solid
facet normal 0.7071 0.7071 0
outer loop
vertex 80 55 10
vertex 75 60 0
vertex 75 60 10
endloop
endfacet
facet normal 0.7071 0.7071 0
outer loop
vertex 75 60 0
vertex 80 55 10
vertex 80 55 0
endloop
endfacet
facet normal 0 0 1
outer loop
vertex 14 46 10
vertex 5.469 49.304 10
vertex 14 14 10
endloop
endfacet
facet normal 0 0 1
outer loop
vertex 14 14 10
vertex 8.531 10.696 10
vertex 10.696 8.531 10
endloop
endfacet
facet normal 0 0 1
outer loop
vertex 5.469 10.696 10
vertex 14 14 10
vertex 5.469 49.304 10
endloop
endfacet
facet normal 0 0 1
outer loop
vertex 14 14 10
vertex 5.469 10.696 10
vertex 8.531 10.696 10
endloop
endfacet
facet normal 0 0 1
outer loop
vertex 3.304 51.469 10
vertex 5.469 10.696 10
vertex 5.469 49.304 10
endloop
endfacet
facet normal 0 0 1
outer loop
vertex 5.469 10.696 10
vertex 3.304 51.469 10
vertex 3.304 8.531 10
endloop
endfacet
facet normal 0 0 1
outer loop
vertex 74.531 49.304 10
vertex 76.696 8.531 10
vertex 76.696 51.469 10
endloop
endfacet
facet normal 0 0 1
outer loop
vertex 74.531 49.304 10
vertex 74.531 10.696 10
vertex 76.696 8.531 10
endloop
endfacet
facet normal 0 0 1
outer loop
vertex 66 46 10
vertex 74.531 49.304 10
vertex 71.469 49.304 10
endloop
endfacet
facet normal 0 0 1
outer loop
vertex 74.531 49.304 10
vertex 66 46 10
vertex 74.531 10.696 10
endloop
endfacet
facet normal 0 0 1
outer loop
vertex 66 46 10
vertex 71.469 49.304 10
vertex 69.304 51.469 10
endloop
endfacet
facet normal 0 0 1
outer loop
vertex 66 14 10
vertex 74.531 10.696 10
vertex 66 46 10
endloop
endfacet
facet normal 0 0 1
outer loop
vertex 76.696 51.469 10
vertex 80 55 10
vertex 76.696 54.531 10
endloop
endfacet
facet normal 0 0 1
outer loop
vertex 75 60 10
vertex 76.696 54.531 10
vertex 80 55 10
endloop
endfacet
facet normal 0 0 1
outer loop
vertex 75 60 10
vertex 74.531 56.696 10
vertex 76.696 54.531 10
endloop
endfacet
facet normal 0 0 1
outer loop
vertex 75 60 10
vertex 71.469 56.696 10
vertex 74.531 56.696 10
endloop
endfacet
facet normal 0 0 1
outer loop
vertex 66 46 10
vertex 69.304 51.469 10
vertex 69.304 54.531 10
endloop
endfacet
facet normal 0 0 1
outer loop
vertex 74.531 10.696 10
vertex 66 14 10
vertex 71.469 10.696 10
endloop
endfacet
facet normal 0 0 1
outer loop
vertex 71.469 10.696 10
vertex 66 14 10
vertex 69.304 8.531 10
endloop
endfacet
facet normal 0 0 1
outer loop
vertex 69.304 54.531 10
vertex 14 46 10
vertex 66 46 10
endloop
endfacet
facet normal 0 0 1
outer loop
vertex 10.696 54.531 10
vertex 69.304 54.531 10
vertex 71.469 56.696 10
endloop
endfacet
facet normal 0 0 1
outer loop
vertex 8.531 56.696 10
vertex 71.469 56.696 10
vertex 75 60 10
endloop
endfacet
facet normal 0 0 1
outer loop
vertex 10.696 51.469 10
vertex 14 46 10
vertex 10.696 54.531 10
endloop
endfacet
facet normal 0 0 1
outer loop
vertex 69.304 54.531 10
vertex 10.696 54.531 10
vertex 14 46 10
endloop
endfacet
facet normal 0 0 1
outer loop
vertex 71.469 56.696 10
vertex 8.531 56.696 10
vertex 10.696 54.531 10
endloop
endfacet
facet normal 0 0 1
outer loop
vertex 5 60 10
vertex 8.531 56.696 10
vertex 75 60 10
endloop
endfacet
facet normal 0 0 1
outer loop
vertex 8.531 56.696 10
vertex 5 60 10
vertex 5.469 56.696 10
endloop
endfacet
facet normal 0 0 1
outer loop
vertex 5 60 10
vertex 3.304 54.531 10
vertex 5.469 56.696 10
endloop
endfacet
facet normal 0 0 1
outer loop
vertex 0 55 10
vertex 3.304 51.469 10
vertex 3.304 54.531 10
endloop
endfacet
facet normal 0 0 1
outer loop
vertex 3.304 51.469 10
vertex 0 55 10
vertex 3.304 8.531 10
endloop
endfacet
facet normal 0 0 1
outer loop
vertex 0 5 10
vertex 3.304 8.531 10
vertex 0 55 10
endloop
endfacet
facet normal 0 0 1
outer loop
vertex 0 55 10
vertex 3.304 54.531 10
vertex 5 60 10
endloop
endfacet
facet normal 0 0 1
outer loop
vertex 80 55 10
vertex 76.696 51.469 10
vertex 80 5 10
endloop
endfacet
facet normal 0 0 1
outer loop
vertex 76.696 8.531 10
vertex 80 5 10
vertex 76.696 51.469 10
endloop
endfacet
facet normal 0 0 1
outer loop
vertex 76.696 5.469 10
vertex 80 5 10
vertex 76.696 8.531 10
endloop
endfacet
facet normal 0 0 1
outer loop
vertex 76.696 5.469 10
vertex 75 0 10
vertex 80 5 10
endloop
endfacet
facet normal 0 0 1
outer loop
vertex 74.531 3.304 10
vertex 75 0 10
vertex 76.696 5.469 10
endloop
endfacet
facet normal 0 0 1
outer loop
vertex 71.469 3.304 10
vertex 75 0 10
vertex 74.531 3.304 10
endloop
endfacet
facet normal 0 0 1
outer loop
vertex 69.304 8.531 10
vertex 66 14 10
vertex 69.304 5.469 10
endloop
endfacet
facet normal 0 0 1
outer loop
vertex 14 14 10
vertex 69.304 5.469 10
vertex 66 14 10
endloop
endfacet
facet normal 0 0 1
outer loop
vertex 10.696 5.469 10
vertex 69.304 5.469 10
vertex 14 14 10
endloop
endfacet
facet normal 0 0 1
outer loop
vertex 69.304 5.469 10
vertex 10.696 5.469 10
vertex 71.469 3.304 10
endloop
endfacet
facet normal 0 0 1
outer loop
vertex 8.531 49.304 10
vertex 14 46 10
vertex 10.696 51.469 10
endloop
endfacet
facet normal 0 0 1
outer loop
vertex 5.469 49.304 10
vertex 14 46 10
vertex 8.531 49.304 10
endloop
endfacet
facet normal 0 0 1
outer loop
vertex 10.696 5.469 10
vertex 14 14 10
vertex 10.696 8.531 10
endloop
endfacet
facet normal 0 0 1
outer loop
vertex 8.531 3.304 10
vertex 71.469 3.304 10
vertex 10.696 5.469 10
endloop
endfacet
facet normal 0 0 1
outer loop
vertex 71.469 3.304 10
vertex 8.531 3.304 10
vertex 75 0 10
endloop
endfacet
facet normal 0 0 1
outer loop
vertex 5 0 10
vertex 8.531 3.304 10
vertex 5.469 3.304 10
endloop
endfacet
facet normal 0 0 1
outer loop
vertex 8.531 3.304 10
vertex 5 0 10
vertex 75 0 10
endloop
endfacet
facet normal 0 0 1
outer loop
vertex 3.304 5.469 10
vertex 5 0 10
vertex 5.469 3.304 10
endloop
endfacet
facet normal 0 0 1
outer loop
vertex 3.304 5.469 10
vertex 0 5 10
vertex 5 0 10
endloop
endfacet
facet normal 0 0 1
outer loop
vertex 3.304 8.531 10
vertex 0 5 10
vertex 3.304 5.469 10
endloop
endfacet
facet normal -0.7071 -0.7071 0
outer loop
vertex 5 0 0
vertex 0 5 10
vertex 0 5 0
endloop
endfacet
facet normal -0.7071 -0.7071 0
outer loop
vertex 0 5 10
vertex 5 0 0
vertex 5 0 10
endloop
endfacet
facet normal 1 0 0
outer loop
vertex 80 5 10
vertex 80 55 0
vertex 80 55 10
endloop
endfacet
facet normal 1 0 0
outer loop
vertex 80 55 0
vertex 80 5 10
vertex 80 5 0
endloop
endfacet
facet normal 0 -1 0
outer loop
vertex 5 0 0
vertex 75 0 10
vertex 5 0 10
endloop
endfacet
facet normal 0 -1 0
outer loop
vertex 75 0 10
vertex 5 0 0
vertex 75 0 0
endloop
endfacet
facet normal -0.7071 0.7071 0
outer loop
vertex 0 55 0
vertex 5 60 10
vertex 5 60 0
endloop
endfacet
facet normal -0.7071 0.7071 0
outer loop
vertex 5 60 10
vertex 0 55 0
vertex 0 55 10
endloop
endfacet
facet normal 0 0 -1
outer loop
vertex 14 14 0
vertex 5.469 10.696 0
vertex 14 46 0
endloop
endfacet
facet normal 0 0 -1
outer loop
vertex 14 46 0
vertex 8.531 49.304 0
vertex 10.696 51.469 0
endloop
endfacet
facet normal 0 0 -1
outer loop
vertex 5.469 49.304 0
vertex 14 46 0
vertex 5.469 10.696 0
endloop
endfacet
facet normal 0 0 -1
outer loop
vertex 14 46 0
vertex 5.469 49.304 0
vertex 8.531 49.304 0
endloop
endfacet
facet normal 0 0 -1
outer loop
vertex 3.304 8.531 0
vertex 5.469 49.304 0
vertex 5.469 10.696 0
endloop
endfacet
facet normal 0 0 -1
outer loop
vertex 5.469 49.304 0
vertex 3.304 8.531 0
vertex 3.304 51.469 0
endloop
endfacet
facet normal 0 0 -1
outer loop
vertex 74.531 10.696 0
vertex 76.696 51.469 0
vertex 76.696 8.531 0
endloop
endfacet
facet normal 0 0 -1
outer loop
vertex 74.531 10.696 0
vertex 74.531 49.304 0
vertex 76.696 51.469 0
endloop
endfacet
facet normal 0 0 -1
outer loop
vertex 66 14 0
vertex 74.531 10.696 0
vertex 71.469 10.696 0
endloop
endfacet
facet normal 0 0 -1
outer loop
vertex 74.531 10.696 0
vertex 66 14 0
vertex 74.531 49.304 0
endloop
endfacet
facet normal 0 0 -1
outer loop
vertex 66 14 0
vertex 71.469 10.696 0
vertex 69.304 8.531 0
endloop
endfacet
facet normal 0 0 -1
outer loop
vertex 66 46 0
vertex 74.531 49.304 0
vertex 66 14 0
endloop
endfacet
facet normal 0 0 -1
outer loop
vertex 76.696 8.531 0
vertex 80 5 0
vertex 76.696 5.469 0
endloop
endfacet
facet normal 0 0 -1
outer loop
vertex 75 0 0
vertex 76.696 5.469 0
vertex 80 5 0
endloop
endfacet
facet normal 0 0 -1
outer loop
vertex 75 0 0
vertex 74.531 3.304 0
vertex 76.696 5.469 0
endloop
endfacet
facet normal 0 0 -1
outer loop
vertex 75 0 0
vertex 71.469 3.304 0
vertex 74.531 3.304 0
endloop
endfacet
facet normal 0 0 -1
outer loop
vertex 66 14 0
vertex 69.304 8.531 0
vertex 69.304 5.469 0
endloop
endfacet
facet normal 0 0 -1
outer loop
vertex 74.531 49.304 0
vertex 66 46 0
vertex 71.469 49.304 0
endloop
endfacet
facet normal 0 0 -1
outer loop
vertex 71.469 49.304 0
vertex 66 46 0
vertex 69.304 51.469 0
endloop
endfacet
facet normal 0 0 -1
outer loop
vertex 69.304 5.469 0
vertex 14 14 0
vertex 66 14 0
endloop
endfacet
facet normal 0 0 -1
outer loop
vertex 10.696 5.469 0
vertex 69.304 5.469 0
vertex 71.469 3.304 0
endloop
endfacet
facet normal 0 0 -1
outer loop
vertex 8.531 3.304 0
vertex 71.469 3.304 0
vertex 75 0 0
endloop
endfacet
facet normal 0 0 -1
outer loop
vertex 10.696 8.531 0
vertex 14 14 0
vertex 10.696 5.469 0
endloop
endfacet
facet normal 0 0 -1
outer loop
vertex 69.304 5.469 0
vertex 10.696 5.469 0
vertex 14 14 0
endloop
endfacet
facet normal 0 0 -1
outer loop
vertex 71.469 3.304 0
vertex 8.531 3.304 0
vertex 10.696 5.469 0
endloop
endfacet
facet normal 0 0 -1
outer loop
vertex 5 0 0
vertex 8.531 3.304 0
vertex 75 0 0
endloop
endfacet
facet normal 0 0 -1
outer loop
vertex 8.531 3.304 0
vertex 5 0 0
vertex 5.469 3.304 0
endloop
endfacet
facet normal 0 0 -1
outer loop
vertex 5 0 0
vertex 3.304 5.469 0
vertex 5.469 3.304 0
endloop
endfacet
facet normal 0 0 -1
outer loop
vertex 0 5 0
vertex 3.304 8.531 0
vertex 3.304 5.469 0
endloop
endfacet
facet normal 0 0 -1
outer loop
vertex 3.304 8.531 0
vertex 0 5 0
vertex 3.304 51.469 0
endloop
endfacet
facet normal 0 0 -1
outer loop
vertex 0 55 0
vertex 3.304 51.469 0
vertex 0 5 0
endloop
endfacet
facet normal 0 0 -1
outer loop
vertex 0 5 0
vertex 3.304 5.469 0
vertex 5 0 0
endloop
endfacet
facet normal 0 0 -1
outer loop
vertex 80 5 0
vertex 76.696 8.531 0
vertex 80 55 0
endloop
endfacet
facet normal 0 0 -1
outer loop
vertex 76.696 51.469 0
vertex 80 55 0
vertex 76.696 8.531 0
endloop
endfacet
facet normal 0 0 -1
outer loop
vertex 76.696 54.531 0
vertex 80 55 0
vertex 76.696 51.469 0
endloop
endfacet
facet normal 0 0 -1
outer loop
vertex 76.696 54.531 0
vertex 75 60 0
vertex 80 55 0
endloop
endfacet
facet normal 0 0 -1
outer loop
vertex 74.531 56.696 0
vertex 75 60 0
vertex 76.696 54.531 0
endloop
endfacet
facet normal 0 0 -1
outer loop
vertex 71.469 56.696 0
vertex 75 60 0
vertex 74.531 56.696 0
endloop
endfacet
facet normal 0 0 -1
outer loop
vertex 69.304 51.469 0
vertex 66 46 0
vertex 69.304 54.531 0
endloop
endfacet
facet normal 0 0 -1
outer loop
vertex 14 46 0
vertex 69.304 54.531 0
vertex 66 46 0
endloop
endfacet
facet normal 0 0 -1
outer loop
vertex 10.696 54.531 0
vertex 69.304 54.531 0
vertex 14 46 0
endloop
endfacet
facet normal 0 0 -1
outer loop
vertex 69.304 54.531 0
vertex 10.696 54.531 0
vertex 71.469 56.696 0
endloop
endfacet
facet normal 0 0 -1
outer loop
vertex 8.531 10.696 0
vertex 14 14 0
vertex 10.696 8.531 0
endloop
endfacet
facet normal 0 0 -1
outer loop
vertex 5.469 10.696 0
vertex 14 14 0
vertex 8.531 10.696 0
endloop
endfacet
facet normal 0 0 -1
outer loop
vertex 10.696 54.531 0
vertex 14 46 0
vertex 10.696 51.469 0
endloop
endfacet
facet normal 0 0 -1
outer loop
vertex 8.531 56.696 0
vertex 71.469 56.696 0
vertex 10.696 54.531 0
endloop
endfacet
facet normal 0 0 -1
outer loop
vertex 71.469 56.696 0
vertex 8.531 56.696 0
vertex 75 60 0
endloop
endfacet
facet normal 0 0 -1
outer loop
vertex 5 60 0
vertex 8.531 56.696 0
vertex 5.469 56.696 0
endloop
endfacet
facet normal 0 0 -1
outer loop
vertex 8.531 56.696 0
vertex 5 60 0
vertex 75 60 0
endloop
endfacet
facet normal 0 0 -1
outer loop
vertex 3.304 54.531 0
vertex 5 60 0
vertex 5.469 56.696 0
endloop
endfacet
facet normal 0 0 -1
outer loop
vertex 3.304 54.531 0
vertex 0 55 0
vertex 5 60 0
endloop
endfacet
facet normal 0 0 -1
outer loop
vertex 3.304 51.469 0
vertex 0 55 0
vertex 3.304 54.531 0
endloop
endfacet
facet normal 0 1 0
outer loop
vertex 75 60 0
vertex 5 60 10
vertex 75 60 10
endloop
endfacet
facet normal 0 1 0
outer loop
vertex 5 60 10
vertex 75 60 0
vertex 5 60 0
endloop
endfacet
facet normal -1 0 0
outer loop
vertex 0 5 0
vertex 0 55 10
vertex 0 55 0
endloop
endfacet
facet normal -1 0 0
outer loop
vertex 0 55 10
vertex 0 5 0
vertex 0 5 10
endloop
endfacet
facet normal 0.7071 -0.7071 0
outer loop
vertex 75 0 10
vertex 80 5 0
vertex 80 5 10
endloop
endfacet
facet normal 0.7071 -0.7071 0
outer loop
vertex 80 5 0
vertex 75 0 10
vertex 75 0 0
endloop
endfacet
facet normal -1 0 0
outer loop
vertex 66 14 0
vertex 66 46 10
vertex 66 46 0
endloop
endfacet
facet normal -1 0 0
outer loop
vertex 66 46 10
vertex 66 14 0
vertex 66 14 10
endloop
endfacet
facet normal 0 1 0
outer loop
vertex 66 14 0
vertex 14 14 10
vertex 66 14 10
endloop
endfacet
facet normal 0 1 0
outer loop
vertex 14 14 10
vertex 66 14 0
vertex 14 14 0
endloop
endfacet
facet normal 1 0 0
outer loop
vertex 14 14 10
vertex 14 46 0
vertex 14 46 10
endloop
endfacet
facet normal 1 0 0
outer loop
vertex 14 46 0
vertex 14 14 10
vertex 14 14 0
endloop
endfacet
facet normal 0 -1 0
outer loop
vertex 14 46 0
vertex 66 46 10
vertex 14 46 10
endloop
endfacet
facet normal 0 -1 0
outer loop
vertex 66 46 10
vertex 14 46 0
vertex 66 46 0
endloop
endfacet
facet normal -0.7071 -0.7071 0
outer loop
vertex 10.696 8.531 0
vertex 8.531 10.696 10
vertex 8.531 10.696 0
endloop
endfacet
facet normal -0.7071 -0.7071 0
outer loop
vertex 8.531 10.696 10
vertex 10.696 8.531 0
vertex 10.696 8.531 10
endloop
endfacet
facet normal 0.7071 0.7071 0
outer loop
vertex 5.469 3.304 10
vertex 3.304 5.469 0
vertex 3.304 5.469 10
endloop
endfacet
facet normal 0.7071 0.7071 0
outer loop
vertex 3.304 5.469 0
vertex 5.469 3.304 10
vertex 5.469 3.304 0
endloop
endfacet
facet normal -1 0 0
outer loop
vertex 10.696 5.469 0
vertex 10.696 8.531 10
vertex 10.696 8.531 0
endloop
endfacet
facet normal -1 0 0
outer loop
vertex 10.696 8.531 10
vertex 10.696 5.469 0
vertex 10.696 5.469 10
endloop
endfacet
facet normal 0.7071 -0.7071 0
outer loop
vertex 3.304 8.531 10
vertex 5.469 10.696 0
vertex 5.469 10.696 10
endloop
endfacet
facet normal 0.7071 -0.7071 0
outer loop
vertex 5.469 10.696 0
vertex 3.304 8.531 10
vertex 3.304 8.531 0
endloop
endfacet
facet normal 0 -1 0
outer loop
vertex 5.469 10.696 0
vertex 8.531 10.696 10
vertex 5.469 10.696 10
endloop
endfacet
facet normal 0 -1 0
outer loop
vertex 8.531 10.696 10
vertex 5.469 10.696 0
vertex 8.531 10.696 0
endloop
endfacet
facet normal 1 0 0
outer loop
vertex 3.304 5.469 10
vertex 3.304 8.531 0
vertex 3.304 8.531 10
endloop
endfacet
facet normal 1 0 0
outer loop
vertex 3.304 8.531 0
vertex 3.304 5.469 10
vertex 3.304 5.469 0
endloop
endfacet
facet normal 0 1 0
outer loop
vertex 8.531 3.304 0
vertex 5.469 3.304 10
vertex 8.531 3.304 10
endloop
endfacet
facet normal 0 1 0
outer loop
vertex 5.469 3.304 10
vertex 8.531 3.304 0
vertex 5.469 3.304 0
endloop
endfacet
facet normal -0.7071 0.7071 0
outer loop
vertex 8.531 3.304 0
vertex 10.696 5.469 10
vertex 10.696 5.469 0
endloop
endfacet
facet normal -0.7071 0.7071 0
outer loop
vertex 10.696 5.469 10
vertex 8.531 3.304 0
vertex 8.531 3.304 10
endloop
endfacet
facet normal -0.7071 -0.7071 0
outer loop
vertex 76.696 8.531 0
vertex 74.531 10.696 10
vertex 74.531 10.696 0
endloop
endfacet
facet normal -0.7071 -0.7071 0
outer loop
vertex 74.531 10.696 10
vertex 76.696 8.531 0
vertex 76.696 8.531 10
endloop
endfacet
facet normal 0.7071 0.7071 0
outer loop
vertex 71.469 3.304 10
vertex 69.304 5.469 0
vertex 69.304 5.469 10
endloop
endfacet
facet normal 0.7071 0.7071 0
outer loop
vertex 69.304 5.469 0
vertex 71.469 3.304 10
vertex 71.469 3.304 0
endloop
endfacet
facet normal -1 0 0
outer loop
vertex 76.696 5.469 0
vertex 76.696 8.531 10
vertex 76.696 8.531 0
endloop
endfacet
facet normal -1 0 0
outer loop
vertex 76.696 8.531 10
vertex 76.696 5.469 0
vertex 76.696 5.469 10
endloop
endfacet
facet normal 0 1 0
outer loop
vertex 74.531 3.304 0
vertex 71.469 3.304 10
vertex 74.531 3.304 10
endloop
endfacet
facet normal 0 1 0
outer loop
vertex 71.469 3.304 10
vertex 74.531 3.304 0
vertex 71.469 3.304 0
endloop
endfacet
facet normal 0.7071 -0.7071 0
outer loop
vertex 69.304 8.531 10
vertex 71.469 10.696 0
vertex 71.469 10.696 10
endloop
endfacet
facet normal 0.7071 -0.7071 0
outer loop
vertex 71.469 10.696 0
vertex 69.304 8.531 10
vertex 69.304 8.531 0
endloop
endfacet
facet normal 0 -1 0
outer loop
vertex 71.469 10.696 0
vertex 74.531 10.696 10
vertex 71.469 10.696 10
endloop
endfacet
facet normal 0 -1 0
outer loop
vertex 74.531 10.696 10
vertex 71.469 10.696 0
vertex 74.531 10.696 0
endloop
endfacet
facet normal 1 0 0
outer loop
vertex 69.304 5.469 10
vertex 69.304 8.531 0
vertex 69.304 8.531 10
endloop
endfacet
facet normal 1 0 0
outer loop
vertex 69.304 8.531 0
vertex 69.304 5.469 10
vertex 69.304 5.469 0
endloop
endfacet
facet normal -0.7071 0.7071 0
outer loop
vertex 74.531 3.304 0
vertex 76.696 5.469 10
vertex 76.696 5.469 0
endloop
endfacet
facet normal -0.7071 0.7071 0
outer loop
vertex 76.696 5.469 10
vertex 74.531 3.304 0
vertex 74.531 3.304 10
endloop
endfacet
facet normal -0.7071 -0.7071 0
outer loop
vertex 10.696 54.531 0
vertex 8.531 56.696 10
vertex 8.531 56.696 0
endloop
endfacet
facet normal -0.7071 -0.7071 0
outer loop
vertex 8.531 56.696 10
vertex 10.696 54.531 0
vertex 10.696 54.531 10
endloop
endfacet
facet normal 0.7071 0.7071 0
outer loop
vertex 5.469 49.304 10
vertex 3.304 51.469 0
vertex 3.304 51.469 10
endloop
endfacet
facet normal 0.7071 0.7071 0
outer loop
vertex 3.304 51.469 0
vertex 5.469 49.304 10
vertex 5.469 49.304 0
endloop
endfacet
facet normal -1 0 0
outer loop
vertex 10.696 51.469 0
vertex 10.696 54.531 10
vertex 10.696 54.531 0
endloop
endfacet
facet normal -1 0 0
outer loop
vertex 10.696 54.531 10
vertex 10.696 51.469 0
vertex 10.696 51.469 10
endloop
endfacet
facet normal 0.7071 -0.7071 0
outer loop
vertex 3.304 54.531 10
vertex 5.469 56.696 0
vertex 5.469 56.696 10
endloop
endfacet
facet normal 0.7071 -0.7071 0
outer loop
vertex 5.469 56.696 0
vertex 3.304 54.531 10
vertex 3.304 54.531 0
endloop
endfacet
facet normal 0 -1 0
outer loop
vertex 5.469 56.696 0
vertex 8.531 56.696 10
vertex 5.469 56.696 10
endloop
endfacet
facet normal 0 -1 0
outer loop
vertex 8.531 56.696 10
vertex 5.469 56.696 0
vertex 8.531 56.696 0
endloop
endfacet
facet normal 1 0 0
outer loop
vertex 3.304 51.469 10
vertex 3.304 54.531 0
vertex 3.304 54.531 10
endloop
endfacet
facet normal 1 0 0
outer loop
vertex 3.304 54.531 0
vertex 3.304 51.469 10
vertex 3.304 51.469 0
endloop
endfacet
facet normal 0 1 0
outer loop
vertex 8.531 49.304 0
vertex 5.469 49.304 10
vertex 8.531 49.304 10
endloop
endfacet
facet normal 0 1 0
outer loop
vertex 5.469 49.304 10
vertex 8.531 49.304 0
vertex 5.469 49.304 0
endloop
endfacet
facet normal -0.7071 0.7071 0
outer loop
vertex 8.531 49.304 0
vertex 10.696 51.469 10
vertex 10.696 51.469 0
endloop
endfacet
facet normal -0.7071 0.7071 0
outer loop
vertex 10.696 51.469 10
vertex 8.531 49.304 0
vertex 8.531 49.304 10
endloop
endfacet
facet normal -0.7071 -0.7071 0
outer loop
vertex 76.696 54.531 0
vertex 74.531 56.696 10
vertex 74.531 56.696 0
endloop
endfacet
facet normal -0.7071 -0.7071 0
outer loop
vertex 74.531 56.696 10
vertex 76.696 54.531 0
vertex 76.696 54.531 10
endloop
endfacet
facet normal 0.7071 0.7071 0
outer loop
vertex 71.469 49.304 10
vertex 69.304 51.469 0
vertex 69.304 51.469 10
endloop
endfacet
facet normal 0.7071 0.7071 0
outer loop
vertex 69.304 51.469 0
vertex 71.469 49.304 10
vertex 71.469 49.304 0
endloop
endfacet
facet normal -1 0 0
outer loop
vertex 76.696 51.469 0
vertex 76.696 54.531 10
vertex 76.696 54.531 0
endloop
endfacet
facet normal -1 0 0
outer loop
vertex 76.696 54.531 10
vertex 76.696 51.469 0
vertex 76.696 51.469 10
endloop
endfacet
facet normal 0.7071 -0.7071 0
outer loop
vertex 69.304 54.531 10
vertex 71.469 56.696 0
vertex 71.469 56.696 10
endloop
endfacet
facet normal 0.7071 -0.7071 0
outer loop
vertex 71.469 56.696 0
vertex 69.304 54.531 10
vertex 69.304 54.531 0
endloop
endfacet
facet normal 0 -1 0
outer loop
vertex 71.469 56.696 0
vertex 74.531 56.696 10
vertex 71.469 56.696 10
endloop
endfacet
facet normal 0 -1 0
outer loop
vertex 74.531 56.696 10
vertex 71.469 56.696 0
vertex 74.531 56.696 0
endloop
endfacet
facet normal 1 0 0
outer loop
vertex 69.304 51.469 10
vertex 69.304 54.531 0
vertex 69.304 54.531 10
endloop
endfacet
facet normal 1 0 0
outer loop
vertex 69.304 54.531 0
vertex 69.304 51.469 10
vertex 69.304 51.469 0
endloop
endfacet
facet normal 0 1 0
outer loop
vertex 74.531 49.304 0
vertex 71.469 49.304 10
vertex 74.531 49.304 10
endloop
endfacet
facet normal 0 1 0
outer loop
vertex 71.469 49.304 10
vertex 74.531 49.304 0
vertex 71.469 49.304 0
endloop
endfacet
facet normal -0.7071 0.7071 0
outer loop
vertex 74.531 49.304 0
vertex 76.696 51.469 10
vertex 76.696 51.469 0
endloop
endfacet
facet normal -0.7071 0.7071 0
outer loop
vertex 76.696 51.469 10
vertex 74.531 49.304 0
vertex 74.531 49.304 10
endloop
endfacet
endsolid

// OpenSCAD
$fn = 32;

// ----------------------------------------------------------------------
// Frame plate: 80 x 60 frame, 14 mm rails
// ----------------------------------------------------------------------

// --- parameters (mm) ---
plate_l = 80;             // plate length, X
plate_w = 60;             // plate width, Y
plate_t = 10;             // plate thickness, Z (extrusion height)
corner_c = 5;             // corner chamfer
frame_bar = 14;           // frame rail width
bolt_r = 4;               // corner bolt window radius
bolt_inset = 7;           // bolt centre inset from the edges

win_l = plate_l - 2 * frame_bar;  // window length
win_w = plate_w - 2 * frame_bar;  // window width
bolt_d = 2 * bolt_r;  // corner hole diameter

profile = [[5, 0], [75, 0], [80, 5], [80, 55], [75, 60], [5, 60], [0, 55], [0, 5]];  // primary outline, 8 points, counter clockwise
void_1 = [[14, 14], [66, 14], [66, 46], [14, 46]];  // the window, 4 points
void_2 = [[10.696, 8.531], [8.531, 10.696], [5.469, 10.696], [3.304, 8.531], [3.304, 5.469], [5.469, 3.304], [8.531, 3.304], [10.696, 5.469]];  // corner bolt window, 8 points
void_3 = [[76.696, 8.531], [74.531, 10.696], [71.469, 10.696], [69.304, 8.531], [69.304, 5.469], [71.469, 3.304], [74.531, 3.304], [76.696, 5.469]];  // corner bolt window, 8 points
void_4 = [[10.696, 54.531], [8.531, 56.696], [5.469, 56.696], [3.304, 54.531], [3.304, 51.469], [5.469, 49.304], [8.531, 49.304], [10.696, 51.469]];  // corner bolt window, 8 points
void_5 = [[76.696, 54.531], [74.531, 56.696], [71.469, 56.696], [69.304, 54.531], [69.304, 51.469], [71.469, 49.304], [74.531, 49.304], [76.696, 51.469]];  // corner bolt window, 8 points

// --- the one profile operation ---
difference() {
  linear_extrude(height = plate_t) polygon(points = profile);
  translate([0, 0, -1])
    linear_extrude(height = plate_t + 2) polygon(points = void_1);
  translate([0, 0, -1])
    linear_extrude(height = plate_t + 2) polygon(points = void_2);
  translate([0, 0, -1])
    linear_extrude(height = plate_t + 2) polygon(points = void_3);
  translate([0, 0, -1])
    linear_extrude(height = plate_t + 2) polygon(points = void_4);
  translate([0, 0, -1])
    linear_extrude(height = plate_t + 2) polygon(points = void_5);
}
